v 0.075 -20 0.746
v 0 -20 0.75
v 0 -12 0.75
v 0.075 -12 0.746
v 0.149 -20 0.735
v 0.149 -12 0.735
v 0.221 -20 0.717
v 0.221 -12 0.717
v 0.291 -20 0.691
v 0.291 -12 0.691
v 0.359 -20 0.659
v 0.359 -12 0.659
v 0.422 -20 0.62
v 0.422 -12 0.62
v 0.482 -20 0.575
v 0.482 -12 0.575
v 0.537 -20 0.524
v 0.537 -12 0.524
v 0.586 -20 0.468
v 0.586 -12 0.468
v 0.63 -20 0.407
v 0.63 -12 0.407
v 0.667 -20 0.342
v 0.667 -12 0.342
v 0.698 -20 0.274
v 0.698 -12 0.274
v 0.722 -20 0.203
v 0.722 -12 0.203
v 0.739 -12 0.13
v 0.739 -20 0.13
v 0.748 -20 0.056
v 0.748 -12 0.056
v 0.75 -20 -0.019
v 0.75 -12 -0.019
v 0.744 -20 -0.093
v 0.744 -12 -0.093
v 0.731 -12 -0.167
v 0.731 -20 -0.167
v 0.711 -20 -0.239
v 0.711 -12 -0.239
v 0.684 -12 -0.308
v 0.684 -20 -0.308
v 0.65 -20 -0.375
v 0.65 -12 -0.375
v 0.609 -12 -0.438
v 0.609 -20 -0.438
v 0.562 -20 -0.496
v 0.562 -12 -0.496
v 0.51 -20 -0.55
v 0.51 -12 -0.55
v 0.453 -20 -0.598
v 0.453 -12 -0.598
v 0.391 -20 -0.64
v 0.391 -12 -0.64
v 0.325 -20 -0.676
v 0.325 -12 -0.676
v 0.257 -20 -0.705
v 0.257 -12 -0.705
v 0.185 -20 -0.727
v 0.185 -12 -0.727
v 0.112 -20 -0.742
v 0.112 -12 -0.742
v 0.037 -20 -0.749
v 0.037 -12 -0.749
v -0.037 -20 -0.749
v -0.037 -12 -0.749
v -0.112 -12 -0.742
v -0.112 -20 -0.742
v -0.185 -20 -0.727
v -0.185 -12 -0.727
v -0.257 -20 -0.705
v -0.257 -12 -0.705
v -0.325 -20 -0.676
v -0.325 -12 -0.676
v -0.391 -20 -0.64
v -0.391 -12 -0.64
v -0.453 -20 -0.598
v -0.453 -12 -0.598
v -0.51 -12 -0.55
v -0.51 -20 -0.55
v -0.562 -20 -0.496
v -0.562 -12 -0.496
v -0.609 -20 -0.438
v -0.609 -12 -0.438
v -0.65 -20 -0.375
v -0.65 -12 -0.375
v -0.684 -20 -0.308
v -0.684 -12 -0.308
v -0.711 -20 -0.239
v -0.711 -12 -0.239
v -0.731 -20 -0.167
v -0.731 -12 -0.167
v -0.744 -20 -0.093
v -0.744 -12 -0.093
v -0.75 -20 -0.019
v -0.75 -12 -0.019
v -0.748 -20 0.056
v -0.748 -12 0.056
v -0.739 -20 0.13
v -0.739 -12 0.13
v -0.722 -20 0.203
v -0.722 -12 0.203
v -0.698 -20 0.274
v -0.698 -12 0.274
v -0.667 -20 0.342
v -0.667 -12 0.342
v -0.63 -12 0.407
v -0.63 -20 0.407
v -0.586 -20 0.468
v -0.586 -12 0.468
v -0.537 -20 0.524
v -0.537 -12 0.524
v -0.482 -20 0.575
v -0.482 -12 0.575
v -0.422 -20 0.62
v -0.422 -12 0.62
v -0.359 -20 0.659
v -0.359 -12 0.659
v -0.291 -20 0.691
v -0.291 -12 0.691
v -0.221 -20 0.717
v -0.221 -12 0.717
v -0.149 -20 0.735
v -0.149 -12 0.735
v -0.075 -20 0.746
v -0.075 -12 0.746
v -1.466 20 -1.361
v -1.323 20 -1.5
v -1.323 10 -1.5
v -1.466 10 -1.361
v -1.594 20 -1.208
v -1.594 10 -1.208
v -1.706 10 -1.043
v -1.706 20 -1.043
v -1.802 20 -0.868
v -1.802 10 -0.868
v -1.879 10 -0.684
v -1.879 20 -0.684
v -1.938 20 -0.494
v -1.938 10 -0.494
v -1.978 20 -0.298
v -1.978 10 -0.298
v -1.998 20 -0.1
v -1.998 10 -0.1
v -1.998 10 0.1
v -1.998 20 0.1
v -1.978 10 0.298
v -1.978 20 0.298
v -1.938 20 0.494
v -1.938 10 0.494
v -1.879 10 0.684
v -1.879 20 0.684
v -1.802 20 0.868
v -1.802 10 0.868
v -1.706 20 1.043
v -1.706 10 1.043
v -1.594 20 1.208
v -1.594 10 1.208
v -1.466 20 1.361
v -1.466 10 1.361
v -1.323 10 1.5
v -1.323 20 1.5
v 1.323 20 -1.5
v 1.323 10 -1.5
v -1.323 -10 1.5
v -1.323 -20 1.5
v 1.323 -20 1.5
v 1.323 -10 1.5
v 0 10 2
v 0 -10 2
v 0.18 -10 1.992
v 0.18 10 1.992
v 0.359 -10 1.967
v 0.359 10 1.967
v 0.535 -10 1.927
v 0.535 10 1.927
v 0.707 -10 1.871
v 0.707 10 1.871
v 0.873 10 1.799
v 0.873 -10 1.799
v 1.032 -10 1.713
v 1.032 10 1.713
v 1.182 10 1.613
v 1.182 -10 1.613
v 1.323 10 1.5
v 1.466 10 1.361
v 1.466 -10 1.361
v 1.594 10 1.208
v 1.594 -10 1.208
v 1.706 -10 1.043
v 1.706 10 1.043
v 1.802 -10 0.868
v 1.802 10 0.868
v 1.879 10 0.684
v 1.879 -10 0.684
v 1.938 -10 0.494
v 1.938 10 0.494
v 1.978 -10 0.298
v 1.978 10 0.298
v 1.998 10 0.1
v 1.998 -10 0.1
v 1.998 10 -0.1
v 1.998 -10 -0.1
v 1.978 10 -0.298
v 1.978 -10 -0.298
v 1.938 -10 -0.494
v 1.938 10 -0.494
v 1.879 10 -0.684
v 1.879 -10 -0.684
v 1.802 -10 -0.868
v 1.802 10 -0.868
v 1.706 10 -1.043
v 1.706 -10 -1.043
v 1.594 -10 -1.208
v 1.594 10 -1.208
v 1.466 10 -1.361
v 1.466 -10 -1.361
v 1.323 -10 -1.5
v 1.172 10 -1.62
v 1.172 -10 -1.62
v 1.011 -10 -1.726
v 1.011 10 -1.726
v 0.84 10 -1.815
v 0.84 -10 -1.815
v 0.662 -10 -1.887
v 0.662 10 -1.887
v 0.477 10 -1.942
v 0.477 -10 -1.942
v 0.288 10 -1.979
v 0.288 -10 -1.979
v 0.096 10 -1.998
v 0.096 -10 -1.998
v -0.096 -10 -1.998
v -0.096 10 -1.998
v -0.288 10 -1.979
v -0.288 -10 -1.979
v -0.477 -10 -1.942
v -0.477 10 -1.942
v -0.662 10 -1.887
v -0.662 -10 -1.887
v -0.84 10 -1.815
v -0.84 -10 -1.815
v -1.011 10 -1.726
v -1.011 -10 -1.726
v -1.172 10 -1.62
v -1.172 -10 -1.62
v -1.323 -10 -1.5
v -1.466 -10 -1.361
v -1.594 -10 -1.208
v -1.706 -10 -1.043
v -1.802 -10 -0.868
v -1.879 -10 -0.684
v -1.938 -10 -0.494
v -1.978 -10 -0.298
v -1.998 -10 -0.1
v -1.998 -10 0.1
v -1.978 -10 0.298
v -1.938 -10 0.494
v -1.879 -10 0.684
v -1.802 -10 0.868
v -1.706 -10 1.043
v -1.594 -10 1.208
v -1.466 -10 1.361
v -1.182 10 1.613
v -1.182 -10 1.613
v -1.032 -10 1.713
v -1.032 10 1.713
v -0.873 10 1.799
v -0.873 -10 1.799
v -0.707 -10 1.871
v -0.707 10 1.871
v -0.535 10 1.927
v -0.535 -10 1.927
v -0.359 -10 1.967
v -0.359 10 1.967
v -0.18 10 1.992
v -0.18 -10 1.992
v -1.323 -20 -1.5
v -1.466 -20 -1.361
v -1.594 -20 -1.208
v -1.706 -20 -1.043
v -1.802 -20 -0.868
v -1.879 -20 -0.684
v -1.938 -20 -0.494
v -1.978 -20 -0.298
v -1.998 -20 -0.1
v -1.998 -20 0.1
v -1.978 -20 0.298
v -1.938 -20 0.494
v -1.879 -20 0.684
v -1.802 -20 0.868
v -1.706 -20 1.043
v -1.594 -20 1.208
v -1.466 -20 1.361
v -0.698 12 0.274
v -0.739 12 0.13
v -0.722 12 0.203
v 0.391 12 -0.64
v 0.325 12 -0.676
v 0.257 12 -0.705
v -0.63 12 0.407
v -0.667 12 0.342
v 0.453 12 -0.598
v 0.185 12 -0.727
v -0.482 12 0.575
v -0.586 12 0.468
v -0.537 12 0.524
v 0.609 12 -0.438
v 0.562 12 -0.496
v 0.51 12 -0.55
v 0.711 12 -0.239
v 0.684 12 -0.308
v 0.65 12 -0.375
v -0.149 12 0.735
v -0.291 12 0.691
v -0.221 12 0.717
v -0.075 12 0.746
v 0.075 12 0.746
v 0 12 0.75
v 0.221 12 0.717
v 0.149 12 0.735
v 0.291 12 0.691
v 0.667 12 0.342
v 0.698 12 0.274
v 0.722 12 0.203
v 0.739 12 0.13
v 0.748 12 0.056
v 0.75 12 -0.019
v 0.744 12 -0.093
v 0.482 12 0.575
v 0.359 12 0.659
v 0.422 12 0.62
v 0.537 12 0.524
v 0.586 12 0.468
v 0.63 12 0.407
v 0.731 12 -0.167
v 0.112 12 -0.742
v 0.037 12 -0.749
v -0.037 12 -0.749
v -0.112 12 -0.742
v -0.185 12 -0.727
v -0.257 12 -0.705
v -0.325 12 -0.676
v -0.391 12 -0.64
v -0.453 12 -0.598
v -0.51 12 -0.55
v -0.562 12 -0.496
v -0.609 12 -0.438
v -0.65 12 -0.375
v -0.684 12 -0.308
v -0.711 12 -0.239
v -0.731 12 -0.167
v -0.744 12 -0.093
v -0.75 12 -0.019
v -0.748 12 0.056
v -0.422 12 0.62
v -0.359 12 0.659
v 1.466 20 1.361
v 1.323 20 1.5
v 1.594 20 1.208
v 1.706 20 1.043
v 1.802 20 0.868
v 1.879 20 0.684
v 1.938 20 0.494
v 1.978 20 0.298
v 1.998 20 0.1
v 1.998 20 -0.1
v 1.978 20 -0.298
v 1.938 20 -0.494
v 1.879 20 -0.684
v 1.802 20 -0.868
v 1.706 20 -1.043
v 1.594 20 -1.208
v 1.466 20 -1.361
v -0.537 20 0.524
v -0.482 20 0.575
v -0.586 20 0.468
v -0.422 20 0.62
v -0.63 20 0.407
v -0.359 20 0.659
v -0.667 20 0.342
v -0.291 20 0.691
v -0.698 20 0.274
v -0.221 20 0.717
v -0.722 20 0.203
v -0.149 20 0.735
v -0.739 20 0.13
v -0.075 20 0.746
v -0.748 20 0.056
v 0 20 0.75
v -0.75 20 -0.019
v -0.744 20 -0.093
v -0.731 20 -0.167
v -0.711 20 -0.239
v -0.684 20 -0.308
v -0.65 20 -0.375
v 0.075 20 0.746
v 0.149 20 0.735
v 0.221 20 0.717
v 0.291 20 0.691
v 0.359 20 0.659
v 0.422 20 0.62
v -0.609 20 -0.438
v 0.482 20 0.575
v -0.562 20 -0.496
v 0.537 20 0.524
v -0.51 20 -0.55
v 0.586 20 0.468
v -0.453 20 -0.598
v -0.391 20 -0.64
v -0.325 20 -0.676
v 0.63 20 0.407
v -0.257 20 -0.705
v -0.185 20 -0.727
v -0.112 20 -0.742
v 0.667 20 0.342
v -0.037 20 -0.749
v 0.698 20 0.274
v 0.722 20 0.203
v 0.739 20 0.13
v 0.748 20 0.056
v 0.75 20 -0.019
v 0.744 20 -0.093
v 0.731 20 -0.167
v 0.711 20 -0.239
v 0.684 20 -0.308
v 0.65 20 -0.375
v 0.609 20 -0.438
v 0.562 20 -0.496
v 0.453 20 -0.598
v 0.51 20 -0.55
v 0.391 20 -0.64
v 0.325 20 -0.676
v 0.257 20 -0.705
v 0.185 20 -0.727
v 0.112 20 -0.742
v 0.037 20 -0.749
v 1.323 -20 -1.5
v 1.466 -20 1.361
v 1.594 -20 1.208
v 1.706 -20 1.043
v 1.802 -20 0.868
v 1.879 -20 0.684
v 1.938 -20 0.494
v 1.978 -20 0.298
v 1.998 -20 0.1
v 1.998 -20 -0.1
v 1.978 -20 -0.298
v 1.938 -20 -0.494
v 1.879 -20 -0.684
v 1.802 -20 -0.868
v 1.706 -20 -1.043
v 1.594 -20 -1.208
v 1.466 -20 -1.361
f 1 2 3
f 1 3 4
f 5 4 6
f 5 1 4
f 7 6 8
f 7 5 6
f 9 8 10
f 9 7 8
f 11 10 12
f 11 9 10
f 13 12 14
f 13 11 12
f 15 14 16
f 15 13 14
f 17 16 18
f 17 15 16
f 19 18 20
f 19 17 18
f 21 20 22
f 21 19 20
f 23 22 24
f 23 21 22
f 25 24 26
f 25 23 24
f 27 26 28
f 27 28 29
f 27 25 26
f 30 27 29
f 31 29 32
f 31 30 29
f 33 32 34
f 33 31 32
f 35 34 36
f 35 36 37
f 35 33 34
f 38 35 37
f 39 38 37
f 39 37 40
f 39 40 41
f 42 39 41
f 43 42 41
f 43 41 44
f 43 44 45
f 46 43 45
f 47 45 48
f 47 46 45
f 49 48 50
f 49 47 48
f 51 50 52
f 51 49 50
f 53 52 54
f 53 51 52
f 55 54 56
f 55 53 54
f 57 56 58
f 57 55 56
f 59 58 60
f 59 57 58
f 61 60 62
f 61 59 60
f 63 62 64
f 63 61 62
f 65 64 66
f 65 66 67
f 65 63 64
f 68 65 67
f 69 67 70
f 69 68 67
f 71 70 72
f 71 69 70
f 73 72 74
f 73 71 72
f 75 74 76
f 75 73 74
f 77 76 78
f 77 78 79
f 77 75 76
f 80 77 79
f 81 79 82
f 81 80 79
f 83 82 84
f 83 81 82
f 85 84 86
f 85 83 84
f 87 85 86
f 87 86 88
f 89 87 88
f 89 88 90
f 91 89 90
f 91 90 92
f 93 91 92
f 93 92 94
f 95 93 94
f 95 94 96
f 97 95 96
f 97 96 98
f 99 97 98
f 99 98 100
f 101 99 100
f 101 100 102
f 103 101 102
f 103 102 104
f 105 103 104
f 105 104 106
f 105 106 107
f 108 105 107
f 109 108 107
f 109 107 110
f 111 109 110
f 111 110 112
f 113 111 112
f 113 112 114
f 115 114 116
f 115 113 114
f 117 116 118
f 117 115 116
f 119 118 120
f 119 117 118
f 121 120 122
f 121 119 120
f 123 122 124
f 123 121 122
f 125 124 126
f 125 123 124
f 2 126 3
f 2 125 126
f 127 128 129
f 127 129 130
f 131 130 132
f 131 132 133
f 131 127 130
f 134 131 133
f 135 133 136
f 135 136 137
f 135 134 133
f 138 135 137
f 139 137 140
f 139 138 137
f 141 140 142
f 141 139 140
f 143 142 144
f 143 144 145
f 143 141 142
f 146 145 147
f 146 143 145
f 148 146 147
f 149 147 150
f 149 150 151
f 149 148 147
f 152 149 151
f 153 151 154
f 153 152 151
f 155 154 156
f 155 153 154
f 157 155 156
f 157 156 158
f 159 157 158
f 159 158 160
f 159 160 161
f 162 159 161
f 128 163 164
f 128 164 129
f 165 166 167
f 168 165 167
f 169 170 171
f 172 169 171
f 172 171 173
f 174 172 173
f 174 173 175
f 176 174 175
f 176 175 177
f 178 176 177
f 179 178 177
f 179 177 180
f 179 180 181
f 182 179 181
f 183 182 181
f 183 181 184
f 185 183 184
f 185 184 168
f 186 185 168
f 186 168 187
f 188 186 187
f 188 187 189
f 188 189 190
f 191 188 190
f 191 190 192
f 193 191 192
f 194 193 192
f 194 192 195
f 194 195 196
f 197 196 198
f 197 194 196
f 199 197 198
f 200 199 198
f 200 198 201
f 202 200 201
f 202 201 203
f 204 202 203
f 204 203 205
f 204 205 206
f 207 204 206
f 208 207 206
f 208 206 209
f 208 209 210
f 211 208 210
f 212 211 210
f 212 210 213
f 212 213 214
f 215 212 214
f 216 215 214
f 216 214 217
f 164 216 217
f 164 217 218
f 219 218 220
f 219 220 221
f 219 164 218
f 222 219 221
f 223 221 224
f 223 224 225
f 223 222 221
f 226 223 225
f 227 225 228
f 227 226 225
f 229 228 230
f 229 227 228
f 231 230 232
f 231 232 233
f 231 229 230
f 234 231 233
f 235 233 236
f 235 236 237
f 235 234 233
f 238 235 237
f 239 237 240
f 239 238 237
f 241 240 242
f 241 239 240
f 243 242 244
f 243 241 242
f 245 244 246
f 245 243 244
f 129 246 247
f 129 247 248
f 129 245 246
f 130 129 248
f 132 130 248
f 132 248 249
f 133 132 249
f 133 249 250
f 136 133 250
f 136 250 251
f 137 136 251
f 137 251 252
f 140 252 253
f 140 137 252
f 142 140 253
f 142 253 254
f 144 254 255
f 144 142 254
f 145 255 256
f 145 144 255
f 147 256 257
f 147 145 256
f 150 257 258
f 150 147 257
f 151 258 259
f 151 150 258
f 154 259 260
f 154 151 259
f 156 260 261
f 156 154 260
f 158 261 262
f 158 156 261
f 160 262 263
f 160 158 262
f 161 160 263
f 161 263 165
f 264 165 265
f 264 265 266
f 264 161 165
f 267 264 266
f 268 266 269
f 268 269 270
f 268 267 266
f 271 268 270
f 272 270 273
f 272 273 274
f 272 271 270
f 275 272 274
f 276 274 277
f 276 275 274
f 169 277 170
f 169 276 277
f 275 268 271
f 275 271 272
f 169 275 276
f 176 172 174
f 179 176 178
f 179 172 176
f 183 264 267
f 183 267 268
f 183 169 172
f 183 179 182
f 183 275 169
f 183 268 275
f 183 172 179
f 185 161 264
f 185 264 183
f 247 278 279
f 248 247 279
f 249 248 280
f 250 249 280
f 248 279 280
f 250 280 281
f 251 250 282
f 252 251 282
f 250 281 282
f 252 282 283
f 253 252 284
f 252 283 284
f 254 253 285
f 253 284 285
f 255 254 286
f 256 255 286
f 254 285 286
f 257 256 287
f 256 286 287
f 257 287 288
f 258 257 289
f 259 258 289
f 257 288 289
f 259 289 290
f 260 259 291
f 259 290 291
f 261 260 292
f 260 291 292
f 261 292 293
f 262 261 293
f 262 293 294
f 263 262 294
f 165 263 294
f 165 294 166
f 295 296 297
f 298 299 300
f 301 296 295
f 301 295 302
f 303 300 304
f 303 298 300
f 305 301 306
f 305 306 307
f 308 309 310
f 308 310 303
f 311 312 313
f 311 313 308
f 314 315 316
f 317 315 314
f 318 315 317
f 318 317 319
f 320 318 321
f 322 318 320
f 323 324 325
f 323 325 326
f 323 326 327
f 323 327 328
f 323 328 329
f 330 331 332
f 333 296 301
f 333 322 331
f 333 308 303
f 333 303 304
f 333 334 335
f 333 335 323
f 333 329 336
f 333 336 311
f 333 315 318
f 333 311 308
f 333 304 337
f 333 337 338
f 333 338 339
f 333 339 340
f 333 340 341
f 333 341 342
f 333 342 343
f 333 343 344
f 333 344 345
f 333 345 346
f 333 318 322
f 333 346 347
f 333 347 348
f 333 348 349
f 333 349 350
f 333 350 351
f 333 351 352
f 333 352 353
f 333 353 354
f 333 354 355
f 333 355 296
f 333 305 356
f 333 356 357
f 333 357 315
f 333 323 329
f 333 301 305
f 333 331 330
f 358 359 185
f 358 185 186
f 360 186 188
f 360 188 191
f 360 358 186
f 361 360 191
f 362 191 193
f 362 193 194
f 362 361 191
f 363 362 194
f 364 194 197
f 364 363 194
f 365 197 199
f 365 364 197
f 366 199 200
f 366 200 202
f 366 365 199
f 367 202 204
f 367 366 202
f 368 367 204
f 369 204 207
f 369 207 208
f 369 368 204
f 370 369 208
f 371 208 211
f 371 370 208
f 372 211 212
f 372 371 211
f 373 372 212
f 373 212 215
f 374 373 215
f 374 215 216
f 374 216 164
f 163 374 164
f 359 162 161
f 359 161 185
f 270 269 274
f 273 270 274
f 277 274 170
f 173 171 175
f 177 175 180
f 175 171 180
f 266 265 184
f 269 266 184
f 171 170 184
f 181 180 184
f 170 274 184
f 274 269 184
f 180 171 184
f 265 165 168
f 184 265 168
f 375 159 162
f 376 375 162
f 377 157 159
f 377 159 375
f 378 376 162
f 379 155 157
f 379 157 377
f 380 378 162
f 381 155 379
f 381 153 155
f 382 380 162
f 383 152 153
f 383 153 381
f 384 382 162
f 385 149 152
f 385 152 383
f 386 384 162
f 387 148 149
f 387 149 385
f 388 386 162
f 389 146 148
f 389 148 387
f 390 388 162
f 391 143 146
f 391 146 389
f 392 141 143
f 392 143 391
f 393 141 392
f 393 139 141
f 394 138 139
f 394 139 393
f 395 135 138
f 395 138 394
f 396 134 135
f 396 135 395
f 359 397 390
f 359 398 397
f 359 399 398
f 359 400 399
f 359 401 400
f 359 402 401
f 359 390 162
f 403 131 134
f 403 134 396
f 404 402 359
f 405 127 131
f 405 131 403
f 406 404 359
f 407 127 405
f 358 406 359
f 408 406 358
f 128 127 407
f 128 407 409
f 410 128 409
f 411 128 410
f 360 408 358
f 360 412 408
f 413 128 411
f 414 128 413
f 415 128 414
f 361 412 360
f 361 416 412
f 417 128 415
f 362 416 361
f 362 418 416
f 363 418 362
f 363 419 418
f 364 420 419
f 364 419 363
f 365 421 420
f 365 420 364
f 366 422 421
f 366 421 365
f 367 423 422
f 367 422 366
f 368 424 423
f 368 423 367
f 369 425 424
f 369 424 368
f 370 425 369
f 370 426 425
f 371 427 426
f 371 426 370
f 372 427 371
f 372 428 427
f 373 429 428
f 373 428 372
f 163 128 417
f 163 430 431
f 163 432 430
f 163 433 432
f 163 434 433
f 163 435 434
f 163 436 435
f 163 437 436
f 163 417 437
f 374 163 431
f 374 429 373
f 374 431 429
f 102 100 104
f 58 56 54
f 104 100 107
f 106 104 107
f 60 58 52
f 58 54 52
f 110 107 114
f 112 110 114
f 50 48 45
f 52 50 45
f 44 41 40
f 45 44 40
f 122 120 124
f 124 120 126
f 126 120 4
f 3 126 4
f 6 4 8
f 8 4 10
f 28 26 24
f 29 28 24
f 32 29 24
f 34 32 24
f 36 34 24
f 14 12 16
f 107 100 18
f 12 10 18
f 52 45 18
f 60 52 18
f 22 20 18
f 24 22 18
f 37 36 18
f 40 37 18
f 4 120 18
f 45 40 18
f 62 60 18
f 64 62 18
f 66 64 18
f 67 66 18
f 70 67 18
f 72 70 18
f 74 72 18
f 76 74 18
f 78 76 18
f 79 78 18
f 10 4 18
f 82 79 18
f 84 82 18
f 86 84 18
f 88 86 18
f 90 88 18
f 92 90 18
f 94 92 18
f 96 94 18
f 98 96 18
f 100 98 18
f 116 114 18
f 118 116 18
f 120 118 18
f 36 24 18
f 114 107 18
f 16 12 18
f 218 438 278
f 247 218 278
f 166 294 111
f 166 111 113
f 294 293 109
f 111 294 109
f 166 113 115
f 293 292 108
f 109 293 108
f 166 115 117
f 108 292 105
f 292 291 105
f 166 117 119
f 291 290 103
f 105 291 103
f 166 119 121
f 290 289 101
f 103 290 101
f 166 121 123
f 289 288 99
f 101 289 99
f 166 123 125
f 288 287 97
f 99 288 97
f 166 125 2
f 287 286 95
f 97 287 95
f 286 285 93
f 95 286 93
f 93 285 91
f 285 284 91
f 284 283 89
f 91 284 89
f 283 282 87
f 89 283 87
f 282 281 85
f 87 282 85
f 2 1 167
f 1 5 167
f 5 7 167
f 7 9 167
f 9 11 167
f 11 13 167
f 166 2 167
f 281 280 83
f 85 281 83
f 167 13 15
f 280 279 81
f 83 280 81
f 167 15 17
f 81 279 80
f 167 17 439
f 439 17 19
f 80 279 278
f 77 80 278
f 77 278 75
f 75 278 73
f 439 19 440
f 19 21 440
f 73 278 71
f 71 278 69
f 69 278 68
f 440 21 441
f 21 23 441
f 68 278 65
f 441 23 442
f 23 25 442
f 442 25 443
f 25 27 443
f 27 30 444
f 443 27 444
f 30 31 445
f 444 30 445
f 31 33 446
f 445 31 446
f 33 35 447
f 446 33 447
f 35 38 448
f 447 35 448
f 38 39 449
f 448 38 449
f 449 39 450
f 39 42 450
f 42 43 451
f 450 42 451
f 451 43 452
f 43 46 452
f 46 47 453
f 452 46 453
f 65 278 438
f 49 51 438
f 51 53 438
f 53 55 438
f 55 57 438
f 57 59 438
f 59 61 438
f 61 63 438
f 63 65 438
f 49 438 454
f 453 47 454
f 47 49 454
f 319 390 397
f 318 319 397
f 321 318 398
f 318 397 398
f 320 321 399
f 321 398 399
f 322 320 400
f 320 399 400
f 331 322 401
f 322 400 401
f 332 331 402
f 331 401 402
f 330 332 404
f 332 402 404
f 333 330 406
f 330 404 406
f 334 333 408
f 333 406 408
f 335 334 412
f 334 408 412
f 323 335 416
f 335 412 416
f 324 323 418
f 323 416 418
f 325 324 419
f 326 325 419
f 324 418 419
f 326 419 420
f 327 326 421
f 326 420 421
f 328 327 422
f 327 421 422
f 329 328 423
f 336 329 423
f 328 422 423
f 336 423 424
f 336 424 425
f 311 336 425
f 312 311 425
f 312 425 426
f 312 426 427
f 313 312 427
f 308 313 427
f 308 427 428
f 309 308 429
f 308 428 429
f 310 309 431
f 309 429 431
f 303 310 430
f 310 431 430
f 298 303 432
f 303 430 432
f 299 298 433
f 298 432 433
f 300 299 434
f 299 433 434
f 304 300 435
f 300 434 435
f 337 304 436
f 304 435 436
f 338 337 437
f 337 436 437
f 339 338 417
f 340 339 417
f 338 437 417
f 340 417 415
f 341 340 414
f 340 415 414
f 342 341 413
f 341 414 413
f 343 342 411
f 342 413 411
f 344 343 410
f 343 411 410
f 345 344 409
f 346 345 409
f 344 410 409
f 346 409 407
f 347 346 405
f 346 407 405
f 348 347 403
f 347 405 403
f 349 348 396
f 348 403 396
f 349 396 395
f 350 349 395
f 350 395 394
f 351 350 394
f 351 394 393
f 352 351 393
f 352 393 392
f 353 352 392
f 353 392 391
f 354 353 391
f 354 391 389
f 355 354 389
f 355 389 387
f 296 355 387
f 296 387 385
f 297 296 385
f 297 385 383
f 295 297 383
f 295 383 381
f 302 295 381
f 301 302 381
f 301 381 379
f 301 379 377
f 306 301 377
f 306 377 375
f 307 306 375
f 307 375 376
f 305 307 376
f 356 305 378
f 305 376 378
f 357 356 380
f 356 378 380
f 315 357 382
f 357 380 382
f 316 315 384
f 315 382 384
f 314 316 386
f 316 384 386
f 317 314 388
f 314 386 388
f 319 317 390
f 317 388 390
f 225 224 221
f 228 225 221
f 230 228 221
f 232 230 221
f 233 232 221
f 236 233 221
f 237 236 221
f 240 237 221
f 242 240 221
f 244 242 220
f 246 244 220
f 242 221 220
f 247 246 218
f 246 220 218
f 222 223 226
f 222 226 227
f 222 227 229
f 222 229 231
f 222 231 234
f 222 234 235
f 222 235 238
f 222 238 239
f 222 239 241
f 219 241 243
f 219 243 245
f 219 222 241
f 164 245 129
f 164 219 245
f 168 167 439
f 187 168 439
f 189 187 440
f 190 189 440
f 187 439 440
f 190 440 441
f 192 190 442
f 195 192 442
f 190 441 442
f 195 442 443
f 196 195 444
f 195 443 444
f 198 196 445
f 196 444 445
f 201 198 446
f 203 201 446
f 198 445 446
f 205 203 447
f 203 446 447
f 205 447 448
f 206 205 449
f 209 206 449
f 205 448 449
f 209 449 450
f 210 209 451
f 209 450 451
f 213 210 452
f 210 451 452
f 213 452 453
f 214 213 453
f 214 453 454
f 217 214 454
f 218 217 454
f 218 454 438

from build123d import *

# Parameters (mm, degrees)
CROQUIS1_R              = 2
SALIENTE_EXTRUIR1_DEPTH = 10
SALIENTE_EXTRUIR2_START = 10
SALIENTE_EXTRUIR2_DEPTH = 10
CROQUIS3_R              = 0.75
CORTAR_EXTRUIR1_DEPTH   = 8


with BuildPart() as part:
    # Croquis1 → Saliente-Extruir1 (new, symmetric)
    with BuildSketch(Plane(origin=(0, 0, 0), x_dir=(1, 0, 0), z_dir=(0, 1, 0))):
        with Locations(Location((0, 0, 0), (0, 0, 270))):
            Circle(CROQUIS1_R)
    extrude(amount=SALIENTE_EXTRUIR1_DEPTH, both=True)

    # Croquis2 → Saliente-Extruir2 (add)
    with BuildSketch(Plane(origin=(0, 10, 0), x_dir=(1, 0, 0), z_dir=(0, 1, 0)).offset(SALIENTE_EXTRUIR2_START)):
        with BuildLine():
            Line((1.322875656, 1.5), (-1.322875656, 1.5))
            ThreePointArc((-1.322875656, 1.5), (-2, 0), (-1.322875656, -1.5))
            Line((-1.322875656, -1.5), (1.322875656, -1.5))
            ThreePointArc((1.322875656, -1.5), (2, 0), (1.322875656, 1.5))
        make_face()
    saliente_extruir2 = extrude(amount=-SALIENTE_EXTRUIR2_DEPTH)

    # Croquis3 → Cortar-Extruir1 (cut)
    with BuildSketch(Plane(origin=(0, 20, 0), x_dir=(1, 0, 0), z_dir=(0, 1, 0))):
        with Locations(Location((0, 0, 0), (0, 0, 270))):
            Circle(CROQUIS3_R)
    cortar_extruir1 = extrude(amount=-CORTAR_EXTRUIR1_DEPTH, mode=Mode.SUBTRACT)

    # Simetría1: Saliente-Extruir2, Cortar-Extruir1 across plane
    add(saliente_extruir2.mirror(Plane.ZX))
    add(cortar_extruir1.mirror(Plane.ZX), mode=Mode.SUBTRACT)


solid = part.part
